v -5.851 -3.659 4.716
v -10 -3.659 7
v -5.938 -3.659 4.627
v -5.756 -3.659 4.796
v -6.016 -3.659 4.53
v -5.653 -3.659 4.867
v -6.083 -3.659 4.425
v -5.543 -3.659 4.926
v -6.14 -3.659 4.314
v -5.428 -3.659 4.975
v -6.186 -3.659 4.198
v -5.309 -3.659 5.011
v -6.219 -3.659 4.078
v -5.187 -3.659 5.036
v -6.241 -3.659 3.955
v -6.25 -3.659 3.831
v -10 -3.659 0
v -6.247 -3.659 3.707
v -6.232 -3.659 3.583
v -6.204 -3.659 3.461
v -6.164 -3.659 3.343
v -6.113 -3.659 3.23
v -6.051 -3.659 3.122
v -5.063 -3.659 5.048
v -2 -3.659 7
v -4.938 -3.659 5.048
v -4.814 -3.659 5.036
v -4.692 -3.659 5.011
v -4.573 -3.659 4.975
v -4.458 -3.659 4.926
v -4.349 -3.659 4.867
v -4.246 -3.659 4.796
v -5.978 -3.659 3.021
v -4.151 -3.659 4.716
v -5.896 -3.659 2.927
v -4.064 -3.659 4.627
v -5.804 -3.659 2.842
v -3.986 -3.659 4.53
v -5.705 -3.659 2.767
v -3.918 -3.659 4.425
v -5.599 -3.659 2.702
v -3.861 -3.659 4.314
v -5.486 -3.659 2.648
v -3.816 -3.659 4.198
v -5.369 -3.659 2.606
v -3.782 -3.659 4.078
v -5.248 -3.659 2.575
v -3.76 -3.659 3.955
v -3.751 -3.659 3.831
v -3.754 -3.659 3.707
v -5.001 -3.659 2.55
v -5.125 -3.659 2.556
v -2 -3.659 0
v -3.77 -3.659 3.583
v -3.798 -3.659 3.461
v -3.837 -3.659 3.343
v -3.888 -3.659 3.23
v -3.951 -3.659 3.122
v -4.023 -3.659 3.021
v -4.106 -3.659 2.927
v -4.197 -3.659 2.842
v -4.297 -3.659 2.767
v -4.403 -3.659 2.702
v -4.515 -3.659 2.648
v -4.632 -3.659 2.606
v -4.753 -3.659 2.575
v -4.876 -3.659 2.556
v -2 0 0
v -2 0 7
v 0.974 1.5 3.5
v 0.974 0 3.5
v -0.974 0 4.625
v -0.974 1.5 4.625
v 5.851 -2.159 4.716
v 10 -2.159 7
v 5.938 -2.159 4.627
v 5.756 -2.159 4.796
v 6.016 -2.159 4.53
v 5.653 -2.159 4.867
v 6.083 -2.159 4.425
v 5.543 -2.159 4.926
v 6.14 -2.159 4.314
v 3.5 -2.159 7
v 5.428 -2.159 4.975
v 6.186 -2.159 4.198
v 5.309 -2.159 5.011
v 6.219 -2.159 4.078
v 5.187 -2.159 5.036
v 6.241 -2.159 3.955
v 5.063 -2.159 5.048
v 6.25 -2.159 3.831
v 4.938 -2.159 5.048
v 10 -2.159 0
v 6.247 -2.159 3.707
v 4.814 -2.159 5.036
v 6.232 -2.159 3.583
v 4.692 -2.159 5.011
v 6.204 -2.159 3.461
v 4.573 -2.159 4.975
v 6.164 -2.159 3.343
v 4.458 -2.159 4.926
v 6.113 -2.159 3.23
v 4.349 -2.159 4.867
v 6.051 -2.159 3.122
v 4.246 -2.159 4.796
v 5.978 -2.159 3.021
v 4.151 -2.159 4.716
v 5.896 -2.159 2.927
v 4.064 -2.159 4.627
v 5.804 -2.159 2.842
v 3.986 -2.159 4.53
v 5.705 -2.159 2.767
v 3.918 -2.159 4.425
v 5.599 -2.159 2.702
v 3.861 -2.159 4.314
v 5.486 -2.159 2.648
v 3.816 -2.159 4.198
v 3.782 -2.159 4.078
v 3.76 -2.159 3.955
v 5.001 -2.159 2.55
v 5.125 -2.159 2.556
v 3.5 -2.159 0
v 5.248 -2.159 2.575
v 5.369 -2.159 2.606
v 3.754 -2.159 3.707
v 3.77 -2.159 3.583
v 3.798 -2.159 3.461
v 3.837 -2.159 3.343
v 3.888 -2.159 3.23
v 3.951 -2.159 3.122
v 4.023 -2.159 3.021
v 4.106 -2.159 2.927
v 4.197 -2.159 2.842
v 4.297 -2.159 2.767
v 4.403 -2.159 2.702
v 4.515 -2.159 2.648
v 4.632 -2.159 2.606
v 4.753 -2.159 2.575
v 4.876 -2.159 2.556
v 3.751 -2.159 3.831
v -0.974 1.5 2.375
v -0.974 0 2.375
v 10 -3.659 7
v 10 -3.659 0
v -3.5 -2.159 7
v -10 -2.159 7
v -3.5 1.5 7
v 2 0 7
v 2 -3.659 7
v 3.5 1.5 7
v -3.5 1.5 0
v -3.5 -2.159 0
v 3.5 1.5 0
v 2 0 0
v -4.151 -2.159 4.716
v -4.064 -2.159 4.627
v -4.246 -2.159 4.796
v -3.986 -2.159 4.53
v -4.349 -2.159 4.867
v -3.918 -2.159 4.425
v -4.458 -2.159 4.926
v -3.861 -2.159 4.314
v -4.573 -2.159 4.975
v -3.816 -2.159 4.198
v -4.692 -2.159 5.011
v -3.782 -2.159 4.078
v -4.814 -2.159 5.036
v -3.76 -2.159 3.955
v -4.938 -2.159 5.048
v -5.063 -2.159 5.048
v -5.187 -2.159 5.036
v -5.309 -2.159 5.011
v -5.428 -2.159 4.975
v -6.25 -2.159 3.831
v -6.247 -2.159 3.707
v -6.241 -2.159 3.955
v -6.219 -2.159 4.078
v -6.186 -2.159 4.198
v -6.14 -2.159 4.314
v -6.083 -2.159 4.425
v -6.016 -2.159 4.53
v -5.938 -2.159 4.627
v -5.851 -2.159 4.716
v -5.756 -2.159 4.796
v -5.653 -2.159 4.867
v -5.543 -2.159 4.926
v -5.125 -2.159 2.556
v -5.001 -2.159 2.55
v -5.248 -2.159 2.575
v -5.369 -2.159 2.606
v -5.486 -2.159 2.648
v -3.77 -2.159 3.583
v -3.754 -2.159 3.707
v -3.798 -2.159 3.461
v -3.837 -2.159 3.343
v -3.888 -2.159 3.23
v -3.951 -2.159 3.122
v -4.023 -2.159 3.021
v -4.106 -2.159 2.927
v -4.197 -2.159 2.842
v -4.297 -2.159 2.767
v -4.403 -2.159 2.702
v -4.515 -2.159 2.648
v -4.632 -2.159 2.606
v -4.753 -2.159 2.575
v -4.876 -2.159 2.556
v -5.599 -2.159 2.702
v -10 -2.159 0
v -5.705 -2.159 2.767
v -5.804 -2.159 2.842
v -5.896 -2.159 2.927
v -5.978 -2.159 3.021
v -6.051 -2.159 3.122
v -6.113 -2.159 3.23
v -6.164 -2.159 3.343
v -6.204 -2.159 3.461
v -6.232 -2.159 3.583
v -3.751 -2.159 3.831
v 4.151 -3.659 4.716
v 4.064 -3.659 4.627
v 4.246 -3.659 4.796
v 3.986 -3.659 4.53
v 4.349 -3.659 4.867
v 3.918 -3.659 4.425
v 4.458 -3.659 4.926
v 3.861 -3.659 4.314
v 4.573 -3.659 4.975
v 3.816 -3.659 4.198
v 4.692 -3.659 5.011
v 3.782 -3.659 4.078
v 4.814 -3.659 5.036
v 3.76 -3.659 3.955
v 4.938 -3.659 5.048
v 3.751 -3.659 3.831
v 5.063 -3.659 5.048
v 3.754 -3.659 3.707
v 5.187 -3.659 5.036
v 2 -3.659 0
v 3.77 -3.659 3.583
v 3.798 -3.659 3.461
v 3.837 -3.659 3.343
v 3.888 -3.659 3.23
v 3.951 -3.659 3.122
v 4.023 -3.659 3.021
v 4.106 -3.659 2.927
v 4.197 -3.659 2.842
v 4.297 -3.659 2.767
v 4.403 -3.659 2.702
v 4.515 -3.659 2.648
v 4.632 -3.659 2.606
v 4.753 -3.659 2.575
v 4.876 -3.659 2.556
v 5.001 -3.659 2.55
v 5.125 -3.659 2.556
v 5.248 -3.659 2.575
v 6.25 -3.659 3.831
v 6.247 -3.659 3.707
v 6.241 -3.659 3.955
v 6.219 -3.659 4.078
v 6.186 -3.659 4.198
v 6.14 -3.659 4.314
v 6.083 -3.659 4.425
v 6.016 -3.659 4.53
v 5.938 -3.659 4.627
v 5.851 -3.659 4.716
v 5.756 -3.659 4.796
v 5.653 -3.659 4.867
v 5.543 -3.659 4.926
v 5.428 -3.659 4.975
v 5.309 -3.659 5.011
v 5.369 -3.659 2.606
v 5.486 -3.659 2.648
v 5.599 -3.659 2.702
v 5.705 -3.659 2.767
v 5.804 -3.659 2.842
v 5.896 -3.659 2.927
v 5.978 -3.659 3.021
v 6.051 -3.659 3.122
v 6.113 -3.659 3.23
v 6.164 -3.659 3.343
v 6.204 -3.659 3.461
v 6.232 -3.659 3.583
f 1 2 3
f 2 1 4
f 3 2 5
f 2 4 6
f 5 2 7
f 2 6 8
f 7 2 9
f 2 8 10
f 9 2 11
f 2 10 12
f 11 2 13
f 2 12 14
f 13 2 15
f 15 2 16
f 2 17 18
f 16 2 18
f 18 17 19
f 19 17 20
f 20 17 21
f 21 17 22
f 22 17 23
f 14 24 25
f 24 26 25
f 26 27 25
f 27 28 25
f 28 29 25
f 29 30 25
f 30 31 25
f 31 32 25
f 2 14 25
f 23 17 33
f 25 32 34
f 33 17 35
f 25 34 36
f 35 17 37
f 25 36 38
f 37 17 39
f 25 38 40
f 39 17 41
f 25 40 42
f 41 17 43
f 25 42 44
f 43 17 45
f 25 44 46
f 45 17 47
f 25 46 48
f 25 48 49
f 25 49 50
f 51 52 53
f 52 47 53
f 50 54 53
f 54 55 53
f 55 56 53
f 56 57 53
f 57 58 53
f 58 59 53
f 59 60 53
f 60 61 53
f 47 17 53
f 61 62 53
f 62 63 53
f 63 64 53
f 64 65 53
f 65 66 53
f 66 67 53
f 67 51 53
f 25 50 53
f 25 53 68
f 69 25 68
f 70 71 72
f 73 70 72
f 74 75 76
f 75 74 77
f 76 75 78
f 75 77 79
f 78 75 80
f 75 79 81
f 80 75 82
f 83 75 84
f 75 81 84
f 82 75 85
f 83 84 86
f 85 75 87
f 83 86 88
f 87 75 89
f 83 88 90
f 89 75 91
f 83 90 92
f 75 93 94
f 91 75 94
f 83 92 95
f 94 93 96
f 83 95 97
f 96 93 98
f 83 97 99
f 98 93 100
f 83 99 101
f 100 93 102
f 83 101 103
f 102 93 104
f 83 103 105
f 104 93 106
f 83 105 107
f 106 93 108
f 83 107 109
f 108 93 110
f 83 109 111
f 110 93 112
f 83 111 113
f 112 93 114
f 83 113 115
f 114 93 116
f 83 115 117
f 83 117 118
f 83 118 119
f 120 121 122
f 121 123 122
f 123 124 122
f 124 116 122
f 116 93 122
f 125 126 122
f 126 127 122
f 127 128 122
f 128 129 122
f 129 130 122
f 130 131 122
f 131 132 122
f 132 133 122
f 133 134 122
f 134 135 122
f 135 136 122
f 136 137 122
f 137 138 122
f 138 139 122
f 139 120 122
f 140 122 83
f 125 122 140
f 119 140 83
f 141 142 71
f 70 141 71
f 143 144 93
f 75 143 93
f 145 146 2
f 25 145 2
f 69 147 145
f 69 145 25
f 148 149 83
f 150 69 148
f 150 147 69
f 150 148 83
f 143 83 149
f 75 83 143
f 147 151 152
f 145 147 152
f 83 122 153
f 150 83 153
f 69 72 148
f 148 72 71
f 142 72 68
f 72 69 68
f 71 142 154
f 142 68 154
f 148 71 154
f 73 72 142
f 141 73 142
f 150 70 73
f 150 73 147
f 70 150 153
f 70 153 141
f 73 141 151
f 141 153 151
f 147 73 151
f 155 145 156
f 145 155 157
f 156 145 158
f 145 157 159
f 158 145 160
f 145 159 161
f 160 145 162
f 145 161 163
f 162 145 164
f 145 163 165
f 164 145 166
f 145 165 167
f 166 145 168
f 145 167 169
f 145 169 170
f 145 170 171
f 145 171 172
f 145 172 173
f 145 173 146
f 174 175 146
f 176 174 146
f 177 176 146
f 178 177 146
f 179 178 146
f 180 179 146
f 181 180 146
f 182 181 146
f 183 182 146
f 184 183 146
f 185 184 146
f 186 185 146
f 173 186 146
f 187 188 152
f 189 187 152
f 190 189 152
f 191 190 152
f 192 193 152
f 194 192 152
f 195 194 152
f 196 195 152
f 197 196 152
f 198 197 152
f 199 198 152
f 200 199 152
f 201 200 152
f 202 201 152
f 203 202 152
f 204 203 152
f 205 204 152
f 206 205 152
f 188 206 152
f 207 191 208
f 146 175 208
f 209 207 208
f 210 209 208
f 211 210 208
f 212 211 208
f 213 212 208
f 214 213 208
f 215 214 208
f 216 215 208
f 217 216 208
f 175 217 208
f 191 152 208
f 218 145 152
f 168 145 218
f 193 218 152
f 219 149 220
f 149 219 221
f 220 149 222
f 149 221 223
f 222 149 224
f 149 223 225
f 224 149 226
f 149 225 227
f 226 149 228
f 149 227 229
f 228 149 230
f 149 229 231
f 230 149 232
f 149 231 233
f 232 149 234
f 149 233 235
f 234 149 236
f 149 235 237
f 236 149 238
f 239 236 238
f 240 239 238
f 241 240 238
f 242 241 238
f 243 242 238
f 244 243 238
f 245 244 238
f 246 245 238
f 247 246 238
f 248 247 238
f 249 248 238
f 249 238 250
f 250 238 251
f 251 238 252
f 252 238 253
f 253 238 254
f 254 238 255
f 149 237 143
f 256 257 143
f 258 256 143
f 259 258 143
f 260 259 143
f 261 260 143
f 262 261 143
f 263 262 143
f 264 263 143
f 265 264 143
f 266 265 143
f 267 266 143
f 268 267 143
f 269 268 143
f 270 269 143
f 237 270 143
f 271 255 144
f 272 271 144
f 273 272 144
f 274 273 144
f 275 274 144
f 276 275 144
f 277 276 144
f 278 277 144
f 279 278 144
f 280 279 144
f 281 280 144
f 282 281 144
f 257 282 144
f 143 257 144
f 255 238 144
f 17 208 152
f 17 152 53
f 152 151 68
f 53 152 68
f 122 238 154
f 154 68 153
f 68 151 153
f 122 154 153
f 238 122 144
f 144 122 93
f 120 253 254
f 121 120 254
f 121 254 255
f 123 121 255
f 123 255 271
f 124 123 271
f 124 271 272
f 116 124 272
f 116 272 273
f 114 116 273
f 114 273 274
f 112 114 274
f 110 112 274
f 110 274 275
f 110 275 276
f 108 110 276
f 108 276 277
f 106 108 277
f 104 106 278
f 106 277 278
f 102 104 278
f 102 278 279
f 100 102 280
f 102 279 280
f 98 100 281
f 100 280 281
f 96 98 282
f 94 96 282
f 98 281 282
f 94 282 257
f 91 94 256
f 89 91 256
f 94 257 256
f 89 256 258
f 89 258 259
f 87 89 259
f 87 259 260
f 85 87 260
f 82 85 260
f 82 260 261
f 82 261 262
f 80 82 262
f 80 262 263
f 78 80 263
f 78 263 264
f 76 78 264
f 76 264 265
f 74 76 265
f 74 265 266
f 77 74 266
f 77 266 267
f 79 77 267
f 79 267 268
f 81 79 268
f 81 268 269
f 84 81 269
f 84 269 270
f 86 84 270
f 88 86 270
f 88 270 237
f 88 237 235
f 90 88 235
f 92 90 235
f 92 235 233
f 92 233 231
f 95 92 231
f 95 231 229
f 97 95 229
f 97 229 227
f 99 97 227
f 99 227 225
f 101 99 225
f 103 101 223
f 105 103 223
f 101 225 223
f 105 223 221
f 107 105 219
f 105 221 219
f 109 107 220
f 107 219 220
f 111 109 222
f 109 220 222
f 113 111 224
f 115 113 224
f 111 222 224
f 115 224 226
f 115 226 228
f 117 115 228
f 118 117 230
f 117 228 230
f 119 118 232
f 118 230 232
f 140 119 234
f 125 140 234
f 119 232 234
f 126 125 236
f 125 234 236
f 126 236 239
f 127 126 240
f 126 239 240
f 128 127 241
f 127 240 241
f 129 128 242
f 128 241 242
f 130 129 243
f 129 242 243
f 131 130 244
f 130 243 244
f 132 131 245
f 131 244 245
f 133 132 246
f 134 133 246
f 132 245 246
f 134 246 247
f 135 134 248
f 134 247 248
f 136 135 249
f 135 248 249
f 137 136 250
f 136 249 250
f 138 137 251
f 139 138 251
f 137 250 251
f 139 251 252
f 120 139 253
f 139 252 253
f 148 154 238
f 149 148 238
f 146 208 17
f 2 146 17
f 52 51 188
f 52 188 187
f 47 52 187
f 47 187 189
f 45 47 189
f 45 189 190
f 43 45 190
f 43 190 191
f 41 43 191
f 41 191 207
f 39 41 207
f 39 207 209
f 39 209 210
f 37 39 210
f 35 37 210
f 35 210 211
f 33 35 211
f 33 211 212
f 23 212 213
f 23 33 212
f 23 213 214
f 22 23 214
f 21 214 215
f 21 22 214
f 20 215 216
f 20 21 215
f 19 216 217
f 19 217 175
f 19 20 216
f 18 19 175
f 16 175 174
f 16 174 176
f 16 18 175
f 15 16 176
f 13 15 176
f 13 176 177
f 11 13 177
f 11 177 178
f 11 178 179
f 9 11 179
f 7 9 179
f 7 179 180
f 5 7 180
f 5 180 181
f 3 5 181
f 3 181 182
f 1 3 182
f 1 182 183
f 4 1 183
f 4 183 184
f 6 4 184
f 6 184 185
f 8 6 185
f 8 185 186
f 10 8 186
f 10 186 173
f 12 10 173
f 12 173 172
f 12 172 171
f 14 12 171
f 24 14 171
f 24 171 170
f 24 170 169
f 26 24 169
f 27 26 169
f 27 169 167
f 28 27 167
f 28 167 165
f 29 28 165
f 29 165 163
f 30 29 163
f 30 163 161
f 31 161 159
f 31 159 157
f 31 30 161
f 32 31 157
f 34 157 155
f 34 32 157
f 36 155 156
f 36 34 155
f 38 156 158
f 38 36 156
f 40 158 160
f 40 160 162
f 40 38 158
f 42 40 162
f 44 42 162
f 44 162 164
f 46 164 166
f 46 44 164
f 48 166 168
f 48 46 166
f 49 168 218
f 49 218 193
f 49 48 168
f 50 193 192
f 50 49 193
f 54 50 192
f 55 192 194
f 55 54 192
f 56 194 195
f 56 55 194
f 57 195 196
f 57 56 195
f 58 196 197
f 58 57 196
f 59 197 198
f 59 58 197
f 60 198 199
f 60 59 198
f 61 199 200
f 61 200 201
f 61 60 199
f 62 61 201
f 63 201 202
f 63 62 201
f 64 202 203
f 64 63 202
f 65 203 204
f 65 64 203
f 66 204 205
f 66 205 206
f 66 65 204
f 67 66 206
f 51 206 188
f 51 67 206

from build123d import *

# Parameters (mm, degrees)
BOSS_EXTRUDE1_DEPTH = 7
CUT_EXTRUDE1_REACH  = 15.252
SKETCH2_R           = 1.25
CUT_EXTRUDE2_REACH  = 14.743


with BuildPart() as part:
    # Sketch1 → Boss-Extrude1 (new body)
    with BuildSketch(Plane.XY):
        Polygon((-10, -3.659090909), (-2, -3.659090909), (-2, 0), (2, 0), (2, -3.659090909), (10, -3.659090909), (10, -2.159090909), (3.5, -2.159090909), (3.5, 1.5), (-3.5, 1.5), (-3.5, -2.159090909), (-10, -2.159090909), align=None)
    extrude(amount=BOSS_EXTRUDE1_DEPTH)

    # Sketch2 → Cut-Extrude1 (cut, up to next)
    with BuildSketch(Plane.XZ.offset(3.659090909), mode=Mode.PRIVATE) as cut_extrude1_sk1:
        with Locations(Location((5.000786438, 3.8, 0), (0, 0, 270))):
            Circle(SKETCH2_R)
    cut_extrude1_tool1 = extrude(cut_extrude1_sk1.sketch, amount=-CUT_EXTRUDE1_REACH, mode=Mode.PRIVATE) & part.part
    cut_extrude1 = cut_extrude1_tool1.solids().sort_by_distance((5.000786, -3.659091, 3.8))[0]
    add(cut_extrude1, mode=Mode.SUBTRACT)

    # Mirror1: Cut-Extrude1 across plane
    add(cut_extrude1.mirror(Plane.ZY), mode=Mode.SUBTRACT)

    # Sketch3 → Cut-Extrude2 (cut, up to next)
    with BuildSketch(Plane.XZ, mode=Mode.PRIVATE) as cut_extrude2_sk1:
        Polygon((0.974278579, 3.5), (-0.974278579, 4.625), (-0.974278579, 2.375), align=None)
    cut_extrude2_tool1 = extrude(cut_extrude2_sk1.sketch, amount=-CUT_EXTRUDE2_REACH, mode=Mode.PRIVATE) & part.part
    add(cut_extrude2_tool1.solids().sort_by_distance((-0.32476, 0, 3.5))[0], mode=Mode.SUBTRACT)


solid = part.part
